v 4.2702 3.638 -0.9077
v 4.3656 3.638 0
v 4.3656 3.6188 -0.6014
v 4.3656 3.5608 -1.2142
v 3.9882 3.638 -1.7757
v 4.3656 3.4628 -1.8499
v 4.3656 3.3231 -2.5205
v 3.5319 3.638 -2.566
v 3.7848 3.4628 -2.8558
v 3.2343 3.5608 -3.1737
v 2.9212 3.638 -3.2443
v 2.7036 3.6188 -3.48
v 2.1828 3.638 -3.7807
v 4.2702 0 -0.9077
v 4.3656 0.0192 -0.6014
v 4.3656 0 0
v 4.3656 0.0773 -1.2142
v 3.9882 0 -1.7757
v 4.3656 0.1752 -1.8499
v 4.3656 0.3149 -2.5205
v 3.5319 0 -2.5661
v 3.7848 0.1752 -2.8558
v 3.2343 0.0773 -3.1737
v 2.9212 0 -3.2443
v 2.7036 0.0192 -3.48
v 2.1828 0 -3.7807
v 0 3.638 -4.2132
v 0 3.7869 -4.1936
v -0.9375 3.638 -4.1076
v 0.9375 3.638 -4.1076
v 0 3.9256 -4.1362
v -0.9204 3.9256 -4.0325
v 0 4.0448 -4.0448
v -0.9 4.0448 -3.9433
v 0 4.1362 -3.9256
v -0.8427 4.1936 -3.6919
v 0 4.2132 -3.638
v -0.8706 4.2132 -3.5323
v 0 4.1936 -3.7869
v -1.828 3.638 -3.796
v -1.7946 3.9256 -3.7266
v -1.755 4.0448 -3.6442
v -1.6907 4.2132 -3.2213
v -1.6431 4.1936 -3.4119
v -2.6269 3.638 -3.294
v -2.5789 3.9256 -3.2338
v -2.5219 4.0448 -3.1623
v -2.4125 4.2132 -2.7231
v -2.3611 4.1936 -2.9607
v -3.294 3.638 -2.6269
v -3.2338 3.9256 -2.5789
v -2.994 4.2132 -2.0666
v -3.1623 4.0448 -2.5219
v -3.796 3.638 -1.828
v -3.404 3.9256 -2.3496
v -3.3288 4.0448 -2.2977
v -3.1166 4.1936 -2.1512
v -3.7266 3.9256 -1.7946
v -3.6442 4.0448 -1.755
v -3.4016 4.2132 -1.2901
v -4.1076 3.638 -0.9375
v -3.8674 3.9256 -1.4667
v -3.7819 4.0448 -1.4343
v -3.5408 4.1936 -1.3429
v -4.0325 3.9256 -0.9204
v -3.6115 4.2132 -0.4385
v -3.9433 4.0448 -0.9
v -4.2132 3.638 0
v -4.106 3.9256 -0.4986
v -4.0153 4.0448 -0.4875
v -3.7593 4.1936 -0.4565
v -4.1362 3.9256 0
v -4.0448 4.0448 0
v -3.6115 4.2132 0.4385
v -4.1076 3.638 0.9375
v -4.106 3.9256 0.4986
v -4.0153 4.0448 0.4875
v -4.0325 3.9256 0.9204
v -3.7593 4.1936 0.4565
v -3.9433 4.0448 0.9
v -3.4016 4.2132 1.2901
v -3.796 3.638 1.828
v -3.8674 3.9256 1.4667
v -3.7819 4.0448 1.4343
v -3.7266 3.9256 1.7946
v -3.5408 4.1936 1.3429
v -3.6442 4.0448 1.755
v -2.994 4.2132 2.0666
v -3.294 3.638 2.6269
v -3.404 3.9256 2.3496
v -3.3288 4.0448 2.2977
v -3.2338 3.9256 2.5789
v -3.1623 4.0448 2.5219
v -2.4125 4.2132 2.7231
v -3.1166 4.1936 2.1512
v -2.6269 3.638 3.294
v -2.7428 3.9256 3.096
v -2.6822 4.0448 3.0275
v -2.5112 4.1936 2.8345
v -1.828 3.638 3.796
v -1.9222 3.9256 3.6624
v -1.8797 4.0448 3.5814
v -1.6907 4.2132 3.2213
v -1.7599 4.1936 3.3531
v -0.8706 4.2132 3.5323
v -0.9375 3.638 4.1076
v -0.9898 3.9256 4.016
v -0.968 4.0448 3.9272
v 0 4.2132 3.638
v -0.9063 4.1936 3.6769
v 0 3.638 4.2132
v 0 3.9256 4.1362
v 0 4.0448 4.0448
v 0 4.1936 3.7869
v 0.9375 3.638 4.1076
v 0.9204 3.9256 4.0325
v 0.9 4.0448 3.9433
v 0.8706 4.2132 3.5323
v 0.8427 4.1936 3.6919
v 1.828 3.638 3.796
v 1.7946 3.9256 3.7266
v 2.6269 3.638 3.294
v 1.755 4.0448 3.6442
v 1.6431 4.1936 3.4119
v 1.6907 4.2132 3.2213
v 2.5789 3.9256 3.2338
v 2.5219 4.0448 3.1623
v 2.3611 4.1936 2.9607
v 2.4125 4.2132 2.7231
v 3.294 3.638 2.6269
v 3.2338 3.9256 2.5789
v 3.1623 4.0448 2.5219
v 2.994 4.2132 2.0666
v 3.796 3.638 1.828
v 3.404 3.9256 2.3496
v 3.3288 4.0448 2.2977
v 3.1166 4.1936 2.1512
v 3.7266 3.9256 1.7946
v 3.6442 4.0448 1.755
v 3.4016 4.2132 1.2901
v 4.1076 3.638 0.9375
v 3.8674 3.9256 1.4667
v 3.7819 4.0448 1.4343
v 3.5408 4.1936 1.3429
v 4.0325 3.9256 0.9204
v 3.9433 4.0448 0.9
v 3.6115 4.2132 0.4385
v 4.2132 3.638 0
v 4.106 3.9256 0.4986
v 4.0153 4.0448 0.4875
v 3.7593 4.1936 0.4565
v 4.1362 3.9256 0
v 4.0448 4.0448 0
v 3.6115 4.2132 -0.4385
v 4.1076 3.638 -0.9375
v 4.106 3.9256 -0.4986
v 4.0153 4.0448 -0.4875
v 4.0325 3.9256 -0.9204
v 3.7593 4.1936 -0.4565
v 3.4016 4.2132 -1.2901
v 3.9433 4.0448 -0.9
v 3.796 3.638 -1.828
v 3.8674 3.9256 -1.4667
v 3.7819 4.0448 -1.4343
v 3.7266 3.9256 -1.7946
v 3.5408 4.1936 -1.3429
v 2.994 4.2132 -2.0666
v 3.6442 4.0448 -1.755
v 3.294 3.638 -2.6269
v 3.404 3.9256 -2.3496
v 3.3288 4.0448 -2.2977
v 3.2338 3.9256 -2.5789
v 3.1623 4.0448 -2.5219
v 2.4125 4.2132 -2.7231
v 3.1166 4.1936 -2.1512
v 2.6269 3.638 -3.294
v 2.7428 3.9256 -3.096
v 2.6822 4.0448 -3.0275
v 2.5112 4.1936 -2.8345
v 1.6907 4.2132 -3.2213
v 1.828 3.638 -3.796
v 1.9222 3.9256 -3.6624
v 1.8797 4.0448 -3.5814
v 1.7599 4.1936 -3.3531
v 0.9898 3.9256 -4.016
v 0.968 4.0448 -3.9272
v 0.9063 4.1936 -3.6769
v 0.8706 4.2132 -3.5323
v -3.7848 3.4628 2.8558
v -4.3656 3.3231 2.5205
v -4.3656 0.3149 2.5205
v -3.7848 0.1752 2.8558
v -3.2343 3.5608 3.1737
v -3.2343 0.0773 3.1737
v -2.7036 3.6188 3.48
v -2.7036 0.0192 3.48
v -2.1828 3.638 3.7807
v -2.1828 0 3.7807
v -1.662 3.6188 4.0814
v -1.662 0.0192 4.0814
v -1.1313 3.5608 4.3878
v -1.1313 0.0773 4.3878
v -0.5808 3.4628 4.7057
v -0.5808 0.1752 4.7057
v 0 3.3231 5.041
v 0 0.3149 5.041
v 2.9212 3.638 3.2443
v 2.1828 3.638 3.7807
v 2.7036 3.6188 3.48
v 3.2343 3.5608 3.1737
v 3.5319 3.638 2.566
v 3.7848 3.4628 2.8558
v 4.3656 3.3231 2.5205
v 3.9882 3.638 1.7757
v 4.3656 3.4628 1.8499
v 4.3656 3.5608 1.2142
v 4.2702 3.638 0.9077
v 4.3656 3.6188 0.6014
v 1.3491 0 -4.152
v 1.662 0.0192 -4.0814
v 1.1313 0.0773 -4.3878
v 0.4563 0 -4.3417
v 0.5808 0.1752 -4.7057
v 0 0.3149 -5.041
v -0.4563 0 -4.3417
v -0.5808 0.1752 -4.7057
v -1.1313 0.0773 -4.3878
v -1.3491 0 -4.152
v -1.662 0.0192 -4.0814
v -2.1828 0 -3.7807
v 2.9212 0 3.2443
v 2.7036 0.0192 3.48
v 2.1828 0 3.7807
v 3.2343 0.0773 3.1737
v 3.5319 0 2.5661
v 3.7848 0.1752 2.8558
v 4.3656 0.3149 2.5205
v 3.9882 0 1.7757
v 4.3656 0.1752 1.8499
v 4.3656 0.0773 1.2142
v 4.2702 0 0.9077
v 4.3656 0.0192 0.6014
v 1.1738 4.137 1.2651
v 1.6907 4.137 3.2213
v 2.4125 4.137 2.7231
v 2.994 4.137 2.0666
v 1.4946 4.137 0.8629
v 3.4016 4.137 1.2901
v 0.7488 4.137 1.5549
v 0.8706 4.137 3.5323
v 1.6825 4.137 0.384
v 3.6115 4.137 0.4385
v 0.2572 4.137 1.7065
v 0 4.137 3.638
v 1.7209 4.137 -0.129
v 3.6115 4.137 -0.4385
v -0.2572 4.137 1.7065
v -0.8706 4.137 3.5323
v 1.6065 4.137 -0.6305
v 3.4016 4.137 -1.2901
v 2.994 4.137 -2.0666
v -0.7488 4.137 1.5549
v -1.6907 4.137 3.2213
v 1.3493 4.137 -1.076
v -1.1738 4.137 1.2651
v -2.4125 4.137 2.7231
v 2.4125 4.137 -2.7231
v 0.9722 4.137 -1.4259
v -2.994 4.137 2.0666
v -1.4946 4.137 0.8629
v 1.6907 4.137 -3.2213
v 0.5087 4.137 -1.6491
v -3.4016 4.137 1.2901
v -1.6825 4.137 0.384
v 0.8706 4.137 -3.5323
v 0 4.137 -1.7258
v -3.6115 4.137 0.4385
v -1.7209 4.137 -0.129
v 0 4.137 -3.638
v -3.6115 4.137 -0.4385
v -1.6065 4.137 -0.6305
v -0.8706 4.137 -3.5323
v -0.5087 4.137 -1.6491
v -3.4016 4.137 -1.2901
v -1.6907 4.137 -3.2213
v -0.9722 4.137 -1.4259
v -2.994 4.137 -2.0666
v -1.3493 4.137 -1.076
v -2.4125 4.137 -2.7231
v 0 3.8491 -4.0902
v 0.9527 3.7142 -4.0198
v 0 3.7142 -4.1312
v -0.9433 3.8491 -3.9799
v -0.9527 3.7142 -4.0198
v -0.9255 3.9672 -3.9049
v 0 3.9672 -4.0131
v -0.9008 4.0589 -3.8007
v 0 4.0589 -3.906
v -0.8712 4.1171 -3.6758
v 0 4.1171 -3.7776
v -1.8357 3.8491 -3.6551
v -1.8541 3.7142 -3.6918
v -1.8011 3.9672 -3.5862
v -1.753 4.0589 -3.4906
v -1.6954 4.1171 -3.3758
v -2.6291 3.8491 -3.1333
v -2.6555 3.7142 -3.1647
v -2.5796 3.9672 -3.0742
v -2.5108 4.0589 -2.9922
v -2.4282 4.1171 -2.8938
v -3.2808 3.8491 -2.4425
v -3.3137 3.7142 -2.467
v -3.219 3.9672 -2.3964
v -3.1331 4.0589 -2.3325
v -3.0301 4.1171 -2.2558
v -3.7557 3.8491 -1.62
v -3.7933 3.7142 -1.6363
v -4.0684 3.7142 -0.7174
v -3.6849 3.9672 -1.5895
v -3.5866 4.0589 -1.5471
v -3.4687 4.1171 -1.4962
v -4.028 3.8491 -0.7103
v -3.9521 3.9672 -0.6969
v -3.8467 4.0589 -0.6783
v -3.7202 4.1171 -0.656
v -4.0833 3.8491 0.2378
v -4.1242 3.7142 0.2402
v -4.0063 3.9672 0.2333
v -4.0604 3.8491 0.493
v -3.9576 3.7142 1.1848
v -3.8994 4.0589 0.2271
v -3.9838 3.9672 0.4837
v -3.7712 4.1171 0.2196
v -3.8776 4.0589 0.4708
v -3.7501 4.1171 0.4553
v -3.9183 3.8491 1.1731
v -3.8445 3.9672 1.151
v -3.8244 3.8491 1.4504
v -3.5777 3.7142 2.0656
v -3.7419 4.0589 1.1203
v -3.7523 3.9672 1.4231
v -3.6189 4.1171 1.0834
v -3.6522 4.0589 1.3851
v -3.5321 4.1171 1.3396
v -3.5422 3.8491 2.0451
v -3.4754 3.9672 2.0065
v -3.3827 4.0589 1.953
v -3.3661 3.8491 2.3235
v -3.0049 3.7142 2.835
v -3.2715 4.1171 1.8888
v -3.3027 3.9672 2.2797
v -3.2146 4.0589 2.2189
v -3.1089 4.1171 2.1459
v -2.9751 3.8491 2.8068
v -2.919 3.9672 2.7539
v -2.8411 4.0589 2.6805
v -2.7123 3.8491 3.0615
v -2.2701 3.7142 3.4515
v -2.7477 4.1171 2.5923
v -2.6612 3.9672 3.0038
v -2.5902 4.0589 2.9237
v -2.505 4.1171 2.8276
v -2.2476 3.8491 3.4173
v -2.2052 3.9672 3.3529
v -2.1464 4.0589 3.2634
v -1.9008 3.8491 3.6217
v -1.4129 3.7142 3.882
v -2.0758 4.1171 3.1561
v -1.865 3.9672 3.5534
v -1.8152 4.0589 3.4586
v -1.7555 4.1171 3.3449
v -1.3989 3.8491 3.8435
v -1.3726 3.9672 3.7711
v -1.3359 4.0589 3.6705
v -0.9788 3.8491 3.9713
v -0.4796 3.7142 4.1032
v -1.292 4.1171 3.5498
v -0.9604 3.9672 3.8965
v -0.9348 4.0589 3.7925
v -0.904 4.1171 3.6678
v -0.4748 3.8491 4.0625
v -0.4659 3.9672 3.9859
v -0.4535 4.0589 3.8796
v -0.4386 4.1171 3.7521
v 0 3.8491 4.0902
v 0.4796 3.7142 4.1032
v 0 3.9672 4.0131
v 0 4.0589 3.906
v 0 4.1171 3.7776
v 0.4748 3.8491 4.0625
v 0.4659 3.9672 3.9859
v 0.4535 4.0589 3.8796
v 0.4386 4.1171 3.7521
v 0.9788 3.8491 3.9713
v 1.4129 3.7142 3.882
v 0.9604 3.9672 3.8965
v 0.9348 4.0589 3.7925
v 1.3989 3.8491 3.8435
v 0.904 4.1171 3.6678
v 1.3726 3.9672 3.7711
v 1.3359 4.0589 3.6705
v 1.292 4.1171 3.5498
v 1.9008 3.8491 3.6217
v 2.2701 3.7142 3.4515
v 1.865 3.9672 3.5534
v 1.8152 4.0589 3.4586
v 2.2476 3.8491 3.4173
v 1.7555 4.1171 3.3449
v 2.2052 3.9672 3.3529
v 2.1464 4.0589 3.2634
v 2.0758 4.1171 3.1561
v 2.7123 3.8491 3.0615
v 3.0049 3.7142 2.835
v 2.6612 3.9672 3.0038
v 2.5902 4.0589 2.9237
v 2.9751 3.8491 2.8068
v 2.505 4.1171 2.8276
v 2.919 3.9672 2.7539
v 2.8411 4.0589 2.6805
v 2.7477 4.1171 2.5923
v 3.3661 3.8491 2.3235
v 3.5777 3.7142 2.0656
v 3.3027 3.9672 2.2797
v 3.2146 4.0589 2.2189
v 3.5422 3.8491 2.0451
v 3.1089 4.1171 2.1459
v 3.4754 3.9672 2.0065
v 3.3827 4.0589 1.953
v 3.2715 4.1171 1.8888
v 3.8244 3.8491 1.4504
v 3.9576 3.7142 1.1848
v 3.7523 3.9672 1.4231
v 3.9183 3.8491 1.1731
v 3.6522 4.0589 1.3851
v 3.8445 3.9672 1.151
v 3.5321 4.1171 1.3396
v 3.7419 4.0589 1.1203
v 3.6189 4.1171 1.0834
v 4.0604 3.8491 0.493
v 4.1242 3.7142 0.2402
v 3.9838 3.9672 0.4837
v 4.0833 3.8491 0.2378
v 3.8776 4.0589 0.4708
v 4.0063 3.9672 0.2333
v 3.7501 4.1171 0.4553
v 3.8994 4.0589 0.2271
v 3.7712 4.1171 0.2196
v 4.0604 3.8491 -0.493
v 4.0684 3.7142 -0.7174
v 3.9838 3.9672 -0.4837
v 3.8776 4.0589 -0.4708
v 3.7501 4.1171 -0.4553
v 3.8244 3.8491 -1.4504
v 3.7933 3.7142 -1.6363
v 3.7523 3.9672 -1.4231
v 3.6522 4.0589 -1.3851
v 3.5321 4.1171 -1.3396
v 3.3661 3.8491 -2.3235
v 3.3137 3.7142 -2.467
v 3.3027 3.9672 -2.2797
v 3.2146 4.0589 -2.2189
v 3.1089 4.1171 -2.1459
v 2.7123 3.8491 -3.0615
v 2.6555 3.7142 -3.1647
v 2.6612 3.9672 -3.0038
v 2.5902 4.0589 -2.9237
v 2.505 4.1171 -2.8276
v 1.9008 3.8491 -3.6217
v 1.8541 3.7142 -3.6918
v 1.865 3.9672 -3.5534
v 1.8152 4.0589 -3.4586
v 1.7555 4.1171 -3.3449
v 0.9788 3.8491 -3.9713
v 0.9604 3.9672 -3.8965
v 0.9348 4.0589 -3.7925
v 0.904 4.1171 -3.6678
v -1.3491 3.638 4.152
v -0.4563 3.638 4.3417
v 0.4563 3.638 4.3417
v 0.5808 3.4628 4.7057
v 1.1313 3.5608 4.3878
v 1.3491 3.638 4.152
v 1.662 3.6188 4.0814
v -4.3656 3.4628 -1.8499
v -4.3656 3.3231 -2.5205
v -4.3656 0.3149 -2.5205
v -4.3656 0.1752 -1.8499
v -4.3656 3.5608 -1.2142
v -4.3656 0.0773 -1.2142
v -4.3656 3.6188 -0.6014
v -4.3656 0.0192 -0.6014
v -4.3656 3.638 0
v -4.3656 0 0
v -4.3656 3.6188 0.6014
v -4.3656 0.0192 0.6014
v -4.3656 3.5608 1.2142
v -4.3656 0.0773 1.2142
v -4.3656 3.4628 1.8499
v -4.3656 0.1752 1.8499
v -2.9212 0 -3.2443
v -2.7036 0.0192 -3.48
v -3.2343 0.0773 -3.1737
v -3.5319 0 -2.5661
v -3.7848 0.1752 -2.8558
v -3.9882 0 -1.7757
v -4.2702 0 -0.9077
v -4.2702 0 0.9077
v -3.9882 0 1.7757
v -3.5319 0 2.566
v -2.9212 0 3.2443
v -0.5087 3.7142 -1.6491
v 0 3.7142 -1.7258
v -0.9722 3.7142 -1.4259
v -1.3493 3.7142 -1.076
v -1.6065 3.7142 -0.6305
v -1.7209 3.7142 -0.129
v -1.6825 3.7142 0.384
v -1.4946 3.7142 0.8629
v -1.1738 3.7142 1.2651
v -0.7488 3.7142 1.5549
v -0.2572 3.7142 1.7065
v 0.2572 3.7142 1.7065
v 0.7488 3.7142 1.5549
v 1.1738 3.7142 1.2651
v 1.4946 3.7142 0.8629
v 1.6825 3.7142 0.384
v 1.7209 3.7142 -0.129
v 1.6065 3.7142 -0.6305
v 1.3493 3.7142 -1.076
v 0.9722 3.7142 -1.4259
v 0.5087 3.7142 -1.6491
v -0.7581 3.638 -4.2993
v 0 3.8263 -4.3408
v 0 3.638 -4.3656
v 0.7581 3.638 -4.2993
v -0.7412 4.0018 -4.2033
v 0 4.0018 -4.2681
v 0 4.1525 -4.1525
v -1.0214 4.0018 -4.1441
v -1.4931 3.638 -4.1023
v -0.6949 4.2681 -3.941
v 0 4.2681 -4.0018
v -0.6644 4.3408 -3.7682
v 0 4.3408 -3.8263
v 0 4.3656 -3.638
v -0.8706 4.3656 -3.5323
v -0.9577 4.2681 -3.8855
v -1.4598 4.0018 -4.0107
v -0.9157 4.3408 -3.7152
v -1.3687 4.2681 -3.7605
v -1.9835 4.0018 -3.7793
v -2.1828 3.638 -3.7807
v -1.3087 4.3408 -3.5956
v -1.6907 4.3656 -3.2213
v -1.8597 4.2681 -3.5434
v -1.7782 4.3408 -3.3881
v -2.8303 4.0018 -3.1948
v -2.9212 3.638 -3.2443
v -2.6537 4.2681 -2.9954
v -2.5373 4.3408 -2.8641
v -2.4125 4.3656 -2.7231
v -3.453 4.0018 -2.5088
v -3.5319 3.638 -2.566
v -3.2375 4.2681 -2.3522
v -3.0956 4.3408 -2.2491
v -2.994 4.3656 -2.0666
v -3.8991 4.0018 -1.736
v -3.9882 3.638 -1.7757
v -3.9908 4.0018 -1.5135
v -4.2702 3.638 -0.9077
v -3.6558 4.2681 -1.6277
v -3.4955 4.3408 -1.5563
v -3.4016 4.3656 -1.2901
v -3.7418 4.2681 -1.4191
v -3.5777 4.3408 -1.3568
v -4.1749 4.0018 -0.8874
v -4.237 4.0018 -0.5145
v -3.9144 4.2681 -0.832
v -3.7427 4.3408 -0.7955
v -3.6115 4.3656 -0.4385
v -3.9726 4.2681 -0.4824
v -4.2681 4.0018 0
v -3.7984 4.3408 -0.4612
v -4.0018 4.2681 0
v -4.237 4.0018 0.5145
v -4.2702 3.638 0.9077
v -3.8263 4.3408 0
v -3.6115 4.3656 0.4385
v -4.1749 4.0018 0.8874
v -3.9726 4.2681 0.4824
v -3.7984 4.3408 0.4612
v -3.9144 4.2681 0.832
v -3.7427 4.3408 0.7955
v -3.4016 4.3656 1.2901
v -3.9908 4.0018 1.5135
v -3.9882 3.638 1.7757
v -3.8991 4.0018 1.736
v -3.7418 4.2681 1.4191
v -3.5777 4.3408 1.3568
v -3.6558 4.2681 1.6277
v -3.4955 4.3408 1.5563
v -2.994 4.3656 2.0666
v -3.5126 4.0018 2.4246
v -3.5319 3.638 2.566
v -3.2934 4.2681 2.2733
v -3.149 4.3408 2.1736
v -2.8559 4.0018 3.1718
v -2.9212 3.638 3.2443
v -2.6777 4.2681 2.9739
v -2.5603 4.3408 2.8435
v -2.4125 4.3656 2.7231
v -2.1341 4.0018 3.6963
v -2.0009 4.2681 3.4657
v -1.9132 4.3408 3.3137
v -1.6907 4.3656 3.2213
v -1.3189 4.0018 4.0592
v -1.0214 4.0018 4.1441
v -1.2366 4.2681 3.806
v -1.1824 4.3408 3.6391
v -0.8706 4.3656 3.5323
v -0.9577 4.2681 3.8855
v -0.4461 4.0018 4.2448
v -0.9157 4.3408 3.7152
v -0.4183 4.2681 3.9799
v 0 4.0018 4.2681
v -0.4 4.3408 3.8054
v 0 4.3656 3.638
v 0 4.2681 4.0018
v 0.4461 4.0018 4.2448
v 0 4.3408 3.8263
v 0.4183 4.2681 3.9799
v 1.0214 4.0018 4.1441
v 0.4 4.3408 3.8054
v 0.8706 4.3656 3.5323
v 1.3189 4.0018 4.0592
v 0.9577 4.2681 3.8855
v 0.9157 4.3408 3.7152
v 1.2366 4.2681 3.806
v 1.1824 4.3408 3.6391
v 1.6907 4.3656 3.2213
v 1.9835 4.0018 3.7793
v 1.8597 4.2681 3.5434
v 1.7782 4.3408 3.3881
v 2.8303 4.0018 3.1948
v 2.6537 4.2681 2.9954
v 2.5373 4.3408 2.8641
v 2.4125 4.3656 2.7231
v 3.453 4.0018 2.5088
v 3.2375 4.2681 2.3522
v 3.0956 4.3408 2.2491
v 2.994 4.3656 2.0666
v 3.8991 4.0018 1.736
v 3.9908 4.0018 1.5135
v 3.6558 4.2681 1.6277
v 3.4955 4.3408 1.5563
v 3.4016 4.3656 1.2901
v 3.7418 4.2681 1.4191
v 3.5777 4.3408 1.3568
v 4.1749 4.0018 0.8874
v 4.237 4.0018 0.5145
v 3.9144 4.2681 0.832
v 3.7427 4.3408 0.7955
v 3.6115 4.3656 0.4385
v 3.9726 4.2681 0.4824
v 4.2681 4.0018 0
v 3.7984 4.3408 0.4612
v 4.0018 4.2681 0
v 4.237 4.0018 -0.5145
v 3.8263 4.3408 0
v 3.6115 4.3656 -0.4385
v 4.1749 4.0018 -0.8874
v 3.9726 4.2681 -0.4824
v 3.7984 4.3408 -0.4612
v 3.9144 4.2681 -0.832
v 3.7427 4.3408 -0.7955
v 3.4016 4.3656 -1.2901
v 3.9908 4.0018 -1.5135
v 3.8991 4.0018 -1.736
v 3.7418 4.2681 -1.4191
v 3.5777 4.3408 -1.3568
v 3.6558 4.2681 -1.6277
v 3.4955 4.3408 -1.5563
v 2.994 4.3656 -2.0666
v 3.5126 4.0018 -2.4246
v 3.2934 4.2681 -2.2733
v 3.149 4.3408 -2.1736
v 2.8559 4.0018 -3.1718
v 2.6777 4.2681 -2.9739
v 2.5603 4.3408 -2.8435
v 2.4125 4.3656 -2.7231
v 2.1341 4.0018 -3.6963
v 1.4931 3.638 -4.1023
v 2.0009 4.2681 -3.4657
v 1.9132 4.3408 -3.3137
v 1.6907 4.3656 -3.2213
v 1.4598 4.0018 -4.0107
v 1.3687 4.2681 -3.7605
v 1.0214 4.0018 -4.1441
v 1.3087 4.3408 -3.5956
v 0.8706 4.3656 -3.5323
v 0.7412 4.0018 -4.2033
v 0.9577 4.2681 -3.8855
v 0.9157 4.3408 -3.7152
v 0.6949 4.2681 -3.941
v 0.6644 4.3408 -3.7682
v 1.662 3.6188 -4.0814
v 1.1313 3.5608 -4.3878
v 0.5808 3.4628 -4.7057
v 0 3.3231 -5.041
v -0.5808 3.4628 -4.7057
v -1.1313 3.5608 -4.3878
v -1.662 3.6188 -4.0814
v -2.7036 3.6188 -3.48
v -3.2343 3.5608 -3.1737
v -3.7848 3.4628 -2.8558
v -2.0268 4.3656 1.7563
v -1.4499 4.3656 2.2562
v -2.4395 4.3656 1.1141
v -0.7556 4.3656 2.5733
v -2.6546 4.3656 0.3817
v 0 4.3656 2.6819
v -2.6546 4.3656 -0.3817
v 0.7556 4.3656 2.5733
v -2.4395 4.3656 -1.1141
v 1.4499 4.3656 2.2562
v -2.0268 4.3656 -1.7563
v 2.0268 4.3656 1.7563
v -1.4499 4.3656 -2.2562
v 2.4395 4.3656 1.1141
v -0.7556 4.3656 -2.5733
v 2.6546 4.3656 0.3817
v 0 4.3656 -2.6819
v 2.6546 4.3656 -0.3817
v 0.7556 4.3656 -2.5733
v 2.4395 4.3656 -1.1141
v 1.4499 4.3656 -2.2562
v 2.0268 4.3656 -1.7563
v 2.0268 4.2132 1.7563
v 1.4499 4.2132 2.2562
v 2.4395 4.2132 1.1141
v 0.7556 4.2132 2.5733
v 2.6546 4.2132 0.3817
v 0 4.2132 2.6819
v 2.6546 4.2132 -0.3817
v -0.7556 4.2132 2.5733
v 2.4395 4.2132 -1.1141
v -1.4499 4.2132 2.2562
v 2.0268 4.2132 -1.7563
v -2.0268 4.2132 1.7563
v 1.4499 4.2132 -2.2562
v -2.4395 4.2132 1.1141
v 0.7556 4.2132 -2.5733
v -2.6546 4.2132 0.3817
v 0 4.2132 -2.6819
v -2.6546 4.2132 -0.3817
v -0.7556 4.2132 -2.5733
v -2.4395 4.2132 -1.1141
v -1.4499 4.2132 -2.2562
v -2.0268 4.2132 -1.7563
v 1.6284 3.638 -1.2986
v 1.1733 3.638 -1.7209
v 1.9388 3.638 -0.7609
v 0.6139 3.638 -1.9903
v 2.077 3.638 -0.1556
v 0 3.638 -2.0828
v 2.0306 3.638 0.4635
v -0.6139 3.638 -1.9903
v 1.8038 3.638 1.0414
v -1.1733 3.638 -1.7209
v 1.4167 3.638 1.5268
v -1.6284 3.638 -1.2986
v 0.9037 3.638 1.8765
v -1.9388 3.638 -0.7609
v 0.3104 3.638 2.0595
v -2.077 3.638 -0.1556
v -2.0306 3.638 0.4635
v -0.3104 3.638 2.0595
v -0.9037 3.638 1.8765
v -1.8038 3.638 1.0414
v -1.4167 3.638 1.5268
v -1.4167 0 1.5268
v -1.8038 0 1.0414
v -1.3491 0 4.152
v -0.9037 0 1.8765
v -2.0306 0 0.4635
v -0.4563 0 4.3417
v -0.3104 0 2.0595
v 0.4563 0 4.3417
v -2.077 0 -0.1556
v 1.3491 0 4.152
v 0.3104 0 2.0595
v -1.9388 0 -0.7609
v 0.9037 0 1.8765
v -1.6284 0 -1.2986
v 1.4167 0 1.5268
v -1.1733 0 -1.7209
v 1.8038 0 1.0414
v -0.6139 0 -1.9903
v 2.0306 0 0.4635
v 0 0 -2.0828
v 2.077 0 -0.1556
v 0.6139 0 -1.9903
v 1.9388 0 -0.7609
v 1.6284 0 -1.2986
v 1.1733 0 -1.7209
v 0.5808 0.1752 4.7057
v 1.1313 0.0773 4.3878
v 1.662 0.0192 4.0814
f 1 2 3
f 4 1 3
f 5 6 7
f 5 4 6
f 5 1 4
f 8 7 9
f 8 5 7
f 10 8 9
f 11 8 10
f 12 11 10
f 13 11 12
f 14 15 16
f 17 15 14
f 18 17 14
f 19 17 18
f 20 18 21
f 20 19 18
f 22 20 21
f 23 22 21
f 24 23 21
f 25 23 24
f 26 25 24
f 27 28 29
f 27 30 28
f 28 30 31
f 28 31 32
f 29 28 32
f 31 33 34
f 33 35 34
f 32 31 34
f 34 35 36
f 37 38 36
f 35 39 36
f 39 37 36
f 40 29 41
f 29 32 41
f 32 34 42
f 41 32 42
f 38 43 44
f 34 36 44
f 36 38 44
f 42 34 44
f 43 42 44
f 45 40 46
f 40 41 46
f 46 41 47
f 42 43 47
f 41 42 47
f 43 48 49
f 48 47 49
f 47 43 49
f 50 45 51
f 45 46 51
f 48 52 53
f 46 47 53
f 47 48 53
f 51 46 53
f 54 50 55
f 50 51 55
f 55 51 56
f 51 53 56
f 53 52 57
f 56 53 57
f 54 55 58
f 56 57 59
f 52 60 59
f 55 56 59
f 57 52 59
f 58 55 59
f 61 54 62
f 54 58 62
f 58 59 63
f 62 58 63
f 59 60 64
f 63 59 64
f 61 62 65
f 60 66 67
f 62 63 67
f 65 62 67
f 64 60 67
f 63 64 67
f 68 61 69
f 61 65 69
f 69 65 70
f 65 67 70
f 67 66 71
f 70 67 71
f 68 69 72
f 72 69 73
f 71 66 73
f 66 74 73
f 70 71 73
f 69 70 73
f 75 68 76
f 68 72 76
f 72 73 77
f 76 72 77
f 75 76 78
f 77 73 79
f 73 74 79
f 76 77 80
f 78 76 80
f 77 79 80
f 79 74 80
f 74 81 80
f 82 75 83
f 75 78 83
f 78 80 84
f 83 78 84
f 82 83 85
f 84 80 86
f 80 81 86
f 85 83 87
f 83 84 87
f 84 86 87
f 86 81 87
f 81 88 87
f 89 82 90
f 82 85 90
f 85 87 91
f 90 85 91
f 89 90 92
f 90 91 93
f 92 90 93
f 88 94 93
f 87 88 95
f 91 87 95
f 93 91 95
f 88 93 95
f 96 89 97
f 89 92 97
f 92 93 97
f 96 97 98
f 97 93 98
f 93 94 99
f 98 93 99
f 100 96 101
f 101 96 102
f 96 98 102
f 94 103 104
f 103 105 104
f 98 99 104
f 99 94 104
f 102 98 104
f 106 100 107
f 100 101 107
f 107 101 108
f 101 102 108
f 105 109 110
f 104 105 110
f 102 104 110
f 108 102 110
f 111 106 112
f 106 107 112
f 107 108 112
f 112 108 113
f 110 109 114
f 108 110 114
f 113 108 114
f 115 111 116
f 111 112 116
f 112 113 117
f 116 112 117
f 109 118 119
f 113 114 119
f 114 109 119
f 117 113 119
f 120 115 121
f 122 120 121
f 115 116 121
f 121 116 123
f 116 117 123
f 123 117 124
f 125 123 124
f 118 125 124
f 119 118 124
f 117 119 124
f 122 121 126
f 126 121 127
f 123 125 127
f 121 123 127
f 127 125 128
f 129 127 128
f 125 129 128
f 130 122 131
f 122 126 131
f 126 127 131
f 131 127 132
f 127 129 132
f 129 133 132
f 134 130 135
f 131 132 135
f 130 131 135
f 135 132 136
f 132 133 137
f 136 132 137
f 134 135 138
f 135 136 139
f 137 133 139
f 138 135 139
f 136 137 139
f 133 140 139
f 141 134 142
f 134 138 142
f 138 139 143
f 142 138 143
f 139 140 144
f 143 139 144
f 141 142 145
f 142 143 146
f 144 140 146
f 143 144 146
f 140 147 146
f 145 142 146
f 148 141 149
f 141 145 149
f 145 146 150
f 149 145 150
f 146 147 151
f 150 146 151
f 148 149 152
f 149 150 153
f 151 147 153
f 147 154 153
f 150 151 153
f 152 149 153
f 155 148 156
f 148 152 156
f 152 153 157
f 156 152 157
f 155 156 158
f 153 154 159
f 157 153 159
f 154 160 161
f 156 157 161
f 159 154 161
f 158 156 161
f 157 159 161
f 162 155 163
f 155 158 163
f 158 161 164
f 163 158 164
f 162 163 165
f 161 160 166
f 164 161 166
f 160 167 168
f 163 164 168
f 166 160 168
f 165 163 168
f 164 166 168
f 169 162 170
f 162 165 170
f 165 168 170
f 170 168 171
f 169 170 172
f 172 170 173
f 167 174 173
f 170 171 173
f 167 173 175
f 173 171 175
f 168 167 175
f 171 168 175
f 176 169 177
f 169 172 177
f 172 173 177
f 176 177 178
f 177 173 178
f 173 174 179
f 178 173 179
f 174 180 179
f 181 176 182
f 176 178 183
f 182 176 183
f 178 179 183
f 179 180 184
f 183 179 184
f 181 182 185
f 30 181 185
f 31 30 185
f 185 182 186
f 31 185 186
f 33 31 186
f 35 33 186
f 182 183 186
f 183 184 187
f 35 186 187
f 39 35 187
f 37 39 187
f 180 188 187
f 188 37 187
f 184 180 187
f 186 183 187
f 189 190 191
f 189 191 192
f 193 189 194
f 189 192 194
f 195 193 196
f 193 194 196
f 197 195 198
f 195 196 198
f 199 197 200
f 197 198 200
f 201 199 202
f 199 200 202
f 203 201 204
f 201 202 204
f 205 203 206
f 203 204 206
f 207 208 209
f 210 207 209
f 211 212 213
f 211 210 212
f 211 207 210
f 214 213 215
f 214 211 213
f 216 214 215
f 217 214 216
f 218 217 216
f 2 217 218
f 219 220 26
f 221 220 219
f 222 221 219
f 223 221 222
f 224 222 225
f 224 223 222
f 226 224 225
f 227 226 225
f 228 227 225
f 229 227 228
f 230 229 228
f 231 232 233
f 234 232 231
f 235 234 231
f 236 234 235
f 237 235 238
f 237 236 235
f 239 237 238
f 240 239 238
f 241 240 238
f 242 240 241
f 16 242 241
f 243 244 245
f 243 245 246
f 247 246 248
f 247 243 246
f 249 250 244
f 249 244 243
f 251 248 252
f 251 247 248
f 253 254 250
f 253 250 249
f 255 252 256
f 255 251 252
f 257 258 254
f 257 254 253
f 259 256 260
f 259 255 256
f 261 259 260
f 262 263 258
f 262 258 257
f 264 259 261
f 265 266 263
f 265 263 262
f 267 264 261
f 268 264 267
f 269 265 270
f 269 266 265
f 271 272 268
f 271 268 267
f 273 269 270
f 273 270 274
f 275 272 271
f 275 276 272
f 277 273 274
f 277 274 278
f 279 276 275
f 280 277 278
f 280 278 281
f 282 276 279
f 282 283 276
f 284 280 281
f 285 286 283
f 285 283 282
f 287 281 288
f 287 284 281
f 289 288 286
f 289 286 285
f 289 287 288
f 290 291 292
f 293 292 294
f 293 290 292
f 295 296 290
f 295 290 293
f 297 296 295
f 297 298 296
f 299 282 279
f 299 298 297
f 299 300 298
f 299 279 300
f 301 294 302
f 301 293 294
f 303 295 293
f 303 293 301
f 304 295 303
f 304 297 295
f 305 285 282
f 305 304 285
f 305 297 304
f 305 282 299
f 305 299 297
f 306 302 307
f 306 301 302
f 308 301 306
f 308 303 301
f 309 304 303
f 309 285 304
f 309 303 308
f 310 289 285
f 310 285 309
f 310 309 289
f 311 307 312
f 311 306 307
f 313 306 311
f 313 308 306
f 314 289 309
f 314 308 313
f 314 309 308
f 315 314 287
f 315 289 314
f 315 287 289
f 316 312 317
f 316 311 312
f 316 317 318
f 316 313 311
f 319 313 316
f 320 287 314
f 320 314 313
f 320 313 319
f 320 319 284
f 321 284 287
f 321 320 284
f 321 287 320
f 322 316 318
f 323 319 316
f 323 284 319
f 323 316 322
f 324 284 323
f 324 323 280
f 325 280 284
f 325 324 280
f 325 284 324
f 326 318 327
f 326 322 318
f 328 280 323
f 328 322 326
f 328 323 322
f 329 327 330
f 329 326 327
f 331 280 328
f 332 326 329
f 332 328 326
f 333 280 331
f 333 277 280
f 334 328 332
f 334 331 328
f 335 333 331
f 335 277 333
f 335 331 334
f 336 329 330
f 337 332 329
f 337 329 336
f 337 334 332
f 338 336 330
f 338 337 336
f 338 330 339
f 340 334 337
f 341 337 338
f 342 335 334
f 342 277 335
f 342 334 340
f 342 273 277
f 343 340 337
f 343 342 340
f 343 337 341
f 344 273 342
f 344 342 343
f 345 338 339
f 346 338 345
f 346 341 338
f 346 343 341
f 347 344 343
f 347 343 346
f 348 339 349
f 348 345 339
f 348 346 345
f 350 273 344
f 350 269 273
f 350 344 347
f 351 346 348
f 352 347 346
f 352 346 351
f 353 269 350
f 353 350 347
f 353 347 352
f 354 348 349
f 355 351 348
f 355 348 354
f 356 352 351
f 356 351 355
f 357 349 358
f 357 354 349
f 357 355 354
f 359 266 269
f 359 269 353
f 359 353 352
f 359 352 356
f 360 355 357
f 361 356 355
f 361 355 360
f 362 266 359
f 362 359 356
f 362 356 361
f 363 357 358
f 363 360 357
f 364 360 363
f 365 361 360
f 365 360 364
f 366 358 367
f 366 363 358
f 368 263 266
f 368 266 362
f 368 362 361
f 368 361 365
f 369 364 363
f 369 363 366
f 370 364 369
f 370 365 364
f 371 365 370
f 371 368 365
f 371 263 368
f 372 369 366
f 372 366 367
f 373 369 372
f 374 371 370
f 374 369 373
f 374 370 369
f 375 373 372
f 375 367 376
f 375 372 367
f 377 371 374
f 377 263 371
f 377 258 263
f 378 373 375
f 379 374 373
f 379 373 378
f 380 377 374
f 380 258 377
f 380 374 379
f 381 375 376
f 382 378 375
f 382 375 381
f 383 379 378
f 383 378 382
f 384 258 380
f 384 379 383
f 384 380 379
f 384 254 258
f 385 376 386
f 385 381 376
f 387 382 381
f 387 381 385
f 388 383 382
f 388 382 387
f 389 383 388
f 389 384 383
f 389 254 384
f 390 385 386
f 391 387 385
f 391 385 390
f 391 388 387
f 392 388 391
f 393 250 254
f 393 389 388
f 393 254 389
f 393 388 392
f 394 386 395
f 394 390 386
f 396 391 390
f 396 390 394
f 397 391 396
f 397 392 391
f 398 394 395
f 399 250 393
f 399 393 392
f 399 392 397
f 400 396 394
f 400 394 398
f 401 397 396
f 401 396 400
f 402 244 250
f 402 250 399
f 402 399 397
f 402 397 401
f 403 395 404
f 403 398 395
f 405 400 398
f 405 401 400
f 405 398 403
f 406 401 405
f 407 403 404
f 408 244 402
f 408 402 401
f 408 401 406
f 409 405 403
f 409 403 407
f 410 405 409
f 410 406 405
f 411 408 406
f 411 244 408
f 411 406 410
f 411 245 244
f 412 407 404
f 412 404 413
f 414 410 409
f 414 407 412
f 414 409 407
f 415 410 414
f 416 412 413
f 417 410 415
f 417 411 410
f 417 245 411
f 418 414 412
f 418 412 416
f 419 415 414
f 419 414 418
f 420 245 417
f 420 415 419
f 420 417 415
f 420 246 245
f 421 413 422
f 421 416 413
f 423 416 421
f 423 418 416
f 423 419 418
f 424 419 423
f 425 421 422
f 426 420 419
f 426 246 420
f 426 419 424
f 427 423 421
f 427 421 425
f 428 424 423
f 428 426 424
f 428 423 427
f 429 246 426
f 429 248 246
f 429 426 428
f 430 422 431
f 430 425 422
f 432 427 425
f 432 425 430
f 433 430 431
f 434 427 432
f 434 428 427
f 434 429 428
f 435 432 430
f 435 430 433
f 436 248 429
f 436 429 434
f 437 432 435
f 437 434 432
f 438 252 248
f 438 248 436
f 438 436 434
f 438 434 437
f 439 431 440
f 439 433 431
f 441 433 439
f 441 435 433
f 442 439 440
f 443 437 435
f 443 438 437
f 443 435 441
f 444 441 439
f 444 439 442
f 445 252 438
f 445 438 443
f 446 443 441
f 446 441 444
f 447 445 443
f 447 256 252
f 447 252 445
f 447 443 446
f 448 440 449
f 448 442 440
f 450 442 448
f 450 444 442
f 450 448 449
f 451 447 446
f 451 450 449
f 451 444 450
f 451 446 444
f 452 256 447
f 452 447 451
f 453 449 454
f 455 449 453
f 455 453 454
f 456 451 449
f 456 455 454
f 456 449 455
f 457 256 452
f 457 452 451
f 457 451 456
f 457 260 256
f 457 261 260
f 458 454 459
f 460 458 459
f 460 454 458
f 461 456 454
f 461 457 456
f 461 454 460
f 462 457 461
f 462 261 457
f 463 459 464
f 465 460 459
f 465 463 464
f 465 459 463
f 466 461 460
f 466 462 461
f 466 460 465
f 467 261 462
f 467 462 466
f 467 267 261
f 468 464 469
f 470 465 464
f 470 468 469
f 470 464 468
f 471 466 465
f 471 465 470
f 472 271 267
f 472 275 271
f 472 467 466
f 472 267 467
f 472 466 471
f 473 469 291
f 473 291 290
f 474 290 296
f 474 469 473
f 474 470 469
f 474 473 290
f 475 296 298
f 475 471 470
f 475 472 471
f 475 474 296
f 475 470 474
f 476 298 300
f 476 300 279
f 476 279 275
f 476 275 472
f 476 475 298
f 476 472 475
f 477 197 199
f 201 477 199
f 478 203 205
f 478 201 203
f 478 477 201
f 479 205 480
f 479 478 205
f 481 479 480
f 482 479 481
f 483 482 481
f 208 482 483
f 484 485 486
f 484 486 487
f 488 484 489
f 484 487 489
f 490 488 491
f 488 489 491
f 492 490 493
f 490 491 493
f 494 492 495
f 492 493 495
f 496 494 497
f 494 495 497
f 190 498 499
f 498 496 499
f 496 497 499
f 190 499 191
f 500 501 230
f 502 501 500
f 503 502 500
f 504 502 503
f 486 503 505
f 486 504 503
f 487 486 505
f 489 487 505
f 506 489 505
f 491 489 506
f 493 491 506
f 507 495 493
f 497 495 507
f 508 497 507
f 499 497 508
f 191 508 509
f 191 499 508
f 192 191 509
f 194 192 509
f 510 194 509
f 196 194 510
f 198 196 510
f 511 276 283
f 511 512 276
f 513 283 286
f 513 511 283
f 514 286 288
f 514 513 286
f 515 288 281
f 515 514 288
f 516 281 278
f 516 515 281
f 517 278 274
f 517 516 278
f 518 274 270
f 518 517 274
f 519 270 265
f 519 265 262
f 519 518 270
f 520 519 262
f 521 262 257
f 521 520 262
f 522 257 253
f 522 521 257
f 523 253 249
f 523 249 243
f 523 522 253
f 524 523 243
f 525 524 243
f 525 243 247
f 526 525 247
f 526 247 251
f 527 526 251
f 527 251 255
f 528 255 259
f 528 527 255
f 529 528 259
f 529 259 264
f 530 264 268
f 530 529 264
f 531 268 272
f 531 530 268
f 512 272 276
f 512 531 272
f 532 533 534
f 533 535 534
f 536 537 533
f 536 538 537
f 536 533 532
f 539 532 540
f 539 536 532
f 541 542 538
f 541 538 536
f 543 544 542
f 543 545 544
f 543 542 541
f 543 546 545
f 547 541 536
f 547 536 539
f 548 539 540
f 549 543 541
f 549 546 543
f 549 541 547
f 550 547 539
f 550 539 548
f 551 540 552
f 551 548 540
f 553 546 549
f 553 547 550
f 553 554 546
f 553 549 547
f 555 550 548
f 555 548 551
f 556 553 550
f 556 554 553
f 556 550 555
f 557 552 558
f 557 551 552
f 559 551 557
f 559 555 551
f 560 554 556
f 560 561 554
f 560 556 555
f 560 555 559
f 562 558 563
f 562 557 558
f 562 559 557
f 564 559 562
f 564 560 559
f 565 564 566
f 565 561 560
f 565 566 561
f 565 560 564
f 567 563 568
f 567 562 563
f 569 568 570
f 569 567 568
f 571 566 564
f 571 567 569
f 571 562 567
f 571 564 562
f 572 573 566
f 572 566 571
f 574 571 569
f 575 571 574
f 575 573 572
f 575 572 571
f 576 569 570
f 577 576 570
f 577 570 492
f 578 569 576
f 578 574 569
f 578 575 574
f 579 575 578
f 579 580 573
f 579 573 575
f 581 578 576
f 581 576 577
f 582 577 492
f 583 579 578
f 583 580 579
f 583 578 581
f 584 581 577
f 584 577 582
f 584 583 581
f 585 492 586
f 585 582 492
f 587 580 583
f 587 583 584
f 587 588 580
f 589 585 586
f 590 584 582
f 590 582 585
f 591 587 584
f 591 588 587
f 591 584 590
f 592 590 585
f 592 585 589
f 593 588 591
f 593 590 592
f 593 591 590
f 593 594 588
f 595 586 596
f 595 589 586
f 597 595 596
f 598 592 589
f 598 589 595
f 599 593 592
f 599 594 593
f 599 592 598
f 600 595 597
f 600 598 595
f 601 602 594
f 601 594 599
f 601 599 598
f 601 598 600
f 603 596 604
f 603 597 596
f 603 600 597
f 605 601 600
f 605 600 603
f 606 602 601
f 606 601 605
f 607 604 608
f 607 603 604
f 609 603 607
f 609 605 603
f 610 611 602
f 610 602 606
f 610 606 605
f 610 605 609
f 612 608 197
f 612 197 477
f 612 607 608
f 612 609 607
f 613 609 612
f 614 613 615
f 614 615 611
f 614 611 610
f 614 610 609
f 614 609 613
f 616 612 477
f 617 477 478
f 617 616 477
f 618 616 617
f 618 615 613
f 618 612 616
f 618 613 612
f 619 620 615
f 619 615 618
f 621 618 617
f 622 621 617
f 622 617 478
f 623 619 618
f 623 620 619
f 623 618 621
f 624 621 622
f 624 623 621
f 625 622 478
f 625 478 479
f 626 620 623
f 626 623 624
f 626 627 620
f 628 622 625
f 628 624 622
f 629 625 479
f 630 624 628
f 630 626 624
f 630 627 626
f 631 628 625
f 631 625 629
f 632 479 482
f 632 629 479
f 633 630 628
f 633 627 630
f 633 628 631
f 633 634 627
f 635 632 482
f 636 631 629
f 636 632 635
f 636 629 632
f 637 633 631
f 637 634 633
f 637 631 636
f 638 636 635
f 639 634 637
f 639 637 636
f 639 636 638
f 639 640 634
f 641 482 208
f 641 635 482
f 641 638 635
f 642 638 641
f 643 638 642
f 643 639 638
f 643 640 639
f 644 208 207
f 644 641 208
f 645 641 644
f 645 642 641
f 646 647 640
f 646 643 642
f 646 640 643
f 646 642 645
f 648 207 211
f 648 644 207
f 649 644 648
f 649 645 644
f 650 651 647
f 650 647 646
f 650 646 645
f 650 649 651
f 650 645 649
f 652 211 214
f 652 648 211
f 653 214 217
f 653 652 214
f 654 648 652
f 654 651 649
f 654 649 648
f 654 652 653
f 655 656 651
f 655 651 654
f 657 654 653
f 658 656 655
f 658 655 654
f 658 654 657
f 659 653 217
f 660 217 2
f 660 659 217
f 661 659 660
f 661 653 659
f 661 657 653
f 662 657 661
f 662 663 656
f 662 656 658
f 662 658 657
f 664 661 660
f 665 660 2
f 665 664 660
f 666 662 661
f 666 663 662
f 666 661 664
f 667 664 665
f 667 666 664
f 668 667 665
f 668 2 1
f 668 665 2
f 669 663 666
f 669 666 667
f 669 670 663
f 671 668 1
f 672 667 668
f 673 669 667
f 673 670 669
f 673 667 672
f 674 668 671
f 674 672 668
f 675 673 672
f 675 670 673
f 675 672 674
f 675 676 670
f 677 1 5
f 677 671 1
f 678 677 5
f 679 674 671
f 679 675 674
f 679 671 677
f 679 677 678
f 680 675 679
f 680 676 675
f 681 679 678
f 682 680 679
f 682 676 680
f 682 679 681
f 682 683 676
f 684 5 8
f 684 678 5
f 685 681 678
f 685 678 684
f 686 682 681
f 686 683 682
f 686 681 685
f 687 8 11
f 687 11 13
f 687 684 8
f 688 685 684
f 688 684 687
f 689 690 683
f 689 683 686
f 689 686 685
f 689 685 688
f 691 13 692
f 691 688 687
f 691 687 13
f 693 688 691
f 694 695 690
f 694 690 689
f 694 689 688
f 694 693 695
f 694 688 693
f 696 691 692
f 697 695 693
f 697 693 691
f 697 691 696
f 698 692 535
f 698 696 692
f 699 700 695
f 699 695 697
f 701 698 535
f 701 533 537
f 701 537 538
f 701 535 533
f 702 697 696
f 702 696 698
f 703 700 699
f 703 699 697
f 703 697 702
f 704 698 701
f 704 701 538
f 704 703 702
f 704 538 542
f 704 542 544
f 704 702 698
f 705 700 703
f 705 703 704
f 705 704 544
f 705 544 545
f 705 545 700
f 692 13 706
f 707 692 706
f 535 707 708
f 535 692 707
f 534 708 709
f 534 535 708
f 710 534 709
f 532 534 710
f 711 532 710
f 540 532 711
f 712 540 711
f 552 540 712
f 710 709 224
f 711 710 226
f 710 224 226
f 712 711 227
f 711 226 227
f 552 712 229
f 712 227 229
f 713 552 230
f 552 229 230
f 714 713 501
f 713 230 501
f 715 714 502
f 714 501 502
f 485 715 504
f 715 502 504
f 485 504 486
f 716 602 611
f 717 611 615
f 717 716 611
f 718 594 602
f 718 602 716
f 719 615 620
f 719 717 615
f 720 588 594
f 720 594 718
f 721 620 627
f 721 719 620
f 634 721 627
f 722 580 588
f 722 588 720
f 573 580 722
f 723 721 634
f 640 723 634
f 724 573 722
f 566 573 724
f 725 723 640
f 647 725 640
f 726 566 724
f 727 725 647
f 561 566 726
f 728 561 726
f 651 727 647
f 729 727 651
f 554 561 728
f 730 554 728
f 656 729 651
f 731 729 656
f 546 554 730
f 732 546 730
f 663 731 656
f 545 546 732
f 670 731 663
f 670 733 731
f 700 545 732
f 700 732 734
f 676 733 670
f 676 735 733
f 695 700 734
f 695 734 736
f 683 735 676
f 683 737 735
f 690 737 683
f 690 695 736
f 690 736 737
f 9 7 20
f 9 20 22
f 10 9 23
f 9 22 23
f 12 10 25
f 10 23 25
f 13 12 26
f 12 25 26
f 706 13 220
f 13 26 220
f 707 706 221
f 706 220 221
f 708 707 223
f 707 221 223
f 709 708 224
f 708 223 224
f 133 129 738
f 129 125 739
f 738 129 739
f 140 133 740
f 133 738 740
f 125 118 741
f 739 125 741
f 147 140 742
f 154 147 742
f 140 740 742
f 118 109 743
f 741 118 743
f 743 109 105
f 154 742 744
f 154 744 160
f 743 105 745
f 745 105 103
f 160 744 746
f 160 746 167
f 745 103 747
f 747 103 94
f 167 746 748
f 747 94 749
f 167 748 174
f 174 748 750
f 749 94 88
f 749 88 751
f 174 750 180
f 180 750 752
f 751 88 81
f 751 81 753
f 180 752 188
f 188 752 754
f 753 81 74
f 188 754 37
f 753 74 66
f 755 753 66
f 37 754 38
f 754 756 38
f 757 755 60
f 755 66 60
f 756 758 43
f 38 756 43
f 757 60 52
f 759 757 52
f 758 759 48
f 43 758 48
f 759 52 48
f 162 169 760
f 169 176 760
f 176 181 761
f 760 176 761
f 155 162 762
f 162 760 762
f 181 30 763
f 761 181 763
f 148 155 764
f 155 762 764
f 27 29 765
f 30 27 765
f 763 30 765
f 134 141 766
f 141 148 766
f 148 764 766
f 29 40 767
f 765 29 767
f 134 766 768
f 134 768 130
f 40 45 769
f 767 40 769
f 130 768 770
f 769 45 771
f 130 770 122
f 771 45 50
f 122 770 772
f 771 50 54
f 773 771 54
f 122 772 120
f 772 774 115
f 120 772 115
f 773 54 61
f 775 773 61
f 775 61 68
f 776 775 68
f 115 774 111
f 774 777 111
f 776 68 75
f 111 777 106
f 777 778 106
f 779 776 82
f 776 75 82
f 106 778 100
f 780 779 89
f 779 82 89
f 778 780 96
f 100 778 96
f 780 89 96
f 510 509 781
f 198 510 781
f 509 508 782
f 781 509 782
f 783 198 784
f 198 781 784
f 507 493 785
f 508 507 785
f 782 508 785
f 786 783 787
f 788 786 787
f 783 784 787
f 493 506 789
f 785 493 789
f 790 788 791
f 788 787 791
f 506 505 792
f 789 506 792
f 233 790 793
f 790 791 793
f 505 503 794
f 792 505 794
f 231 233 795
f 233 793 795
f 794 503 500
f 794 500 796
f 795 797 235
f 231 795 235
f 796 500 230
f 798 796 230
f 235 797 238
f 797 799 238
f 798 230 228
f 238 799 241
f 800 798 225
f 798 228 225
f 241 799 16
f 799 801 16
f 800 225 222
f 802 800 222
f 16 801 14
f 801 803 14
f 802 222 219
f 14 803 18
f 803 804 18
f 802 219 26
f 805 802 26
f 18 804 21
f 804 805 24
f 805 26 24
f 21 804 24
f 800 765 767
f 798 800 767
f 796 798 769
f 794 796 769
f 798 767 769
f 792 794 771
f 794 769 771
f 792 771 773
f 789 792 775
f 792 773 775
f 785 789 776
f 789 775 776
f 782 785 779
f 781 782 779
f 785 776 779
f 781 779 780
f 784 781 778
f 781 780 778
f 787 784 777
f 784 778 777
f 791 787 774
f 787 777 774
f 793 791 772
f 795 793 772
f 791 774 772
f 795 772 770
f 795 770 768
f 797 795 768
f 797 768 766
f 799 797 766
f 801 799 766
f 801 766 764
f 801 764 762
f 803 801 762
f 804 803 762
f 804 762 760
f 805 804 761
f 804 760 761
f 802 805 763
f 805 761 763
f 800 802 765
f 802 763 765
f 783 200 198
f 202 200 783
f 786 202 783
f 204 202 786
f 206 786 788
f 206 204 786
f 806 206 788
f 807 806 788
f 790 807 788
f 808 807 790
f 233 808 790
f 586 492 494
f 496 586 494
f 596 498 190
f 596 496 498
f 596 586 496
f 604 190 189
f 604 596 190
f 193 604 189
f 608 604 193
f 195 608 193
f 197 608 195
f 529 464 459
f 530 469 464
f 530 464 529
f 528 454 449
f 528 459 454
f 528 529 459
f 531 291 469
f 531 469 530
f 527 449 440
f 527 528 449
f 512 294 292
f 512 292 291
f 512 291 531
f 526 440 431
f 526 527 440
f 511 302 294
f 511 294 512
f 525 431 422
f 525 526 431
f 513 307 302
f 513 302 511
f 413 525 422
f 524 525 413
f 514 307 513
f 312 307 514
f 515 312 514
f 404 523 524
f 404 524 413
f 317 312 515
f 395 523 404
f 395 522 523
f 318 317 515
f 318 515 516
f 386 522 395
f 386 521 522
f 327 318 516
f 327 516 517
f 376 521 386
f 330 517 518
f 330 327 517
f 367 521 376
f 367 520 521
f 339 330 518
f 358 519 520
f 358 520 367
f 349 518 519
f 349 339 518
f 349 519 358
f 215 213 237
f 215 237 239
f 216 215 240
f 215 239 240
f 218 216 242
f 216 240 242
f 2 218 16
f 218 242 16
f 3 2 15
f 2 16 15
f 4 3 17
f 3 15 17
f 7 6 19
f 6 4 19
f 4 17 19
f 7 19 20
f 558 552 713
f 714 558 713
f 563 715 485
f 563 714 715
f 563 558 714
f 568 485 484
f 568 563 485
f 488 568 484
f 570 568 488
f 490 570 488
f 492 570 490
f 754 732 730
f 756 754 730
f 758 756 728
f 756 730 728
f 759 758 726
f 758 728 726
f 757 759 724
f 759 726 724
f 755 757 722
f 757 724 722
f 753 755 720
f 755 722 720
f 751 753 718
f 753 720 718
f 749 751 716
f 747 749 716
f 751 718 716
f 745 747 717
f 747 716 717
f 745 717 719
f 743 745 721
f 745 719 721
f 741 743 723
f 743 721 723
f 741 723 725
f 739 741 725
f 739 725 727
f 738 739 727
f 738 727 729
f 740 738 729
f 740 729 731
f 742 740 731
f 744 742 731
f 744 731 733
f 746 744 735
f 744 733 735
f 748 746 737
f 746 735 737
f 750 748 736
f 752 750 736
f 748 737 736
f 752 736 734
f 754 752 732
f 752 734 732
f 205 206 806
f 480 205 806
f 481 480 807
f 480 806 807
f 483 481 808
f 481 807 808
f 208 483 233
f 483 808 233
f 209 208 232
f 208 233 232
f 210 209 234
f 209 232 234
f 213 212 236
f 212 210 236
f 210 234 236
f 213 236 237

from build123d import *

# Parameters (mm, degrees)
EXTRUDE1_DEPTH = 4.365625
SKETCH2_W      = 2.0828
SKETCH2_H      = 4.365625


with BuildPart() as part:
    # Sketch1 → Extrude1 (new body)
    with BuildSketch(Plane(origin=(0, 0, 0), x_dir=(1, 0, 0), z_dir=(0, 1, 0))):
        Polygon((0, 5.040989538), (-4.365625, 2.520494769), (-4.365625, -2.520494769), (0, -5.040989538), (4.365625, -2.520494769), (4.365625, 2.520494769), align=None)
    extrude(amount=EXTRUDE1_DEPTH)


with BuildPart() as body_2:
    # Sketch2 → Revolve1 (revolve)
    with BuildSketch(Plane(origin=(0, 0, 0), x_dir=(0, 0, -1), z_dir=(1, 0, 0))):
        with Locations((1.0414, 2.1828125)):
            Rectangle(SKETCH2_W, SKETCH2_H)
    revolve(axis=Axis((0, -2.0828, 0), (0, 1, 0)))


with BuildPart() as part_1:
    add(part.part)

    # Combine1: cut body 2
    add(body_2.part, mode=Mode.SUBTRACT)

    # Sketch5 → Cut-Revolve3 (revolve, cut)
    with BuildSketch(Plane(origin=(0, 0, 0), x_dir=(0, 0, -1), z_dir=(1, 0, 0))):
        with BuildLine():
            Line((0, 0), (4.365625, 0))
            Line((4.365625, 0), (5.040989538, 0.314927656))
            Line((5.040989538, 0.314927656), (5.040989538, 3.323093177))
            Line((5.040989538, 3.323093177), (4.365625, 3.638020833))
            ThreePointArc((4.365625, 3.638020833), (4.152514674, 4.152514674), (3.638020833, 4.365625))
            Line((3.638020833, 4.365625), (3.638020833, 5.635625))
            Line((3.638020833, 5.635625), (6.310989538, 5.635625))
            Line((6.310989538, 5.635625), (6.310989538, -1.27))
            Line((6.310989538, -1.27), (0, -1.27))
            Line((0, -1.27), (0, 0))
        make_face()
    revolve(axis=Axis((0, 0, 0), (0, 1, 0)), mode=Mode.SUBTRACT)

    # Sketch6 → Cut-Revolve4 (revolve, cut)
    with BuildSketch(Plane(origin=(0, 0, 0), x_dir=(0, 0, -1), z_dir=(1, 0, 0))):
        with BuildLine():
            Line((0, 3.638020833), (4.213225, 3.638020833))
            ThreePointArc((4.213225, 3.638020833), (4.0447516, 4.0447516), (3.638020833, 4.213225))
            Line((3.638020833, 4.213225), (2.681893026, 4.213225))
            Line((2.681893026, 4.213225), (2.681893026, 5.635625))
            Line((2.681893026, 5.635625), (0, 5.635625))
            Line((0, 5.635625), (0, 3.638020833))
        make_face()
    revolve(axis=Axis((0, 5.635625, 0), (0, 1, 0)), mode=Mode.SUBTRACT)


with BuildPart() as body_2_2:
    # Sketch7 → Revolve2 (revolve)
    with BuildSketch(Plane(origin=(0, 0, 0), x_dir=(0, 0, -1), z_dir=(1, 0, 0))):
        with BuildLine():
            Line((1.725765218, 3.714220833), (4.131172654, 3.714220833))
            ThreePointArc((4.131172654, 3.714220833), (3.962813876, 4.016854092), (3.638020833, 4.137025))
            Line((3.638020833, 4.137025), (1.725765218, 4.137025))
            Line((1.725765218, 4.137025), (1.725765218, 3.714220833))
        make_face()
    revolve(axis=Axis((0, 3.714220833, 0), (0, 1, 0)))


solid = Compound([part_1.part, body_2_2.part])
